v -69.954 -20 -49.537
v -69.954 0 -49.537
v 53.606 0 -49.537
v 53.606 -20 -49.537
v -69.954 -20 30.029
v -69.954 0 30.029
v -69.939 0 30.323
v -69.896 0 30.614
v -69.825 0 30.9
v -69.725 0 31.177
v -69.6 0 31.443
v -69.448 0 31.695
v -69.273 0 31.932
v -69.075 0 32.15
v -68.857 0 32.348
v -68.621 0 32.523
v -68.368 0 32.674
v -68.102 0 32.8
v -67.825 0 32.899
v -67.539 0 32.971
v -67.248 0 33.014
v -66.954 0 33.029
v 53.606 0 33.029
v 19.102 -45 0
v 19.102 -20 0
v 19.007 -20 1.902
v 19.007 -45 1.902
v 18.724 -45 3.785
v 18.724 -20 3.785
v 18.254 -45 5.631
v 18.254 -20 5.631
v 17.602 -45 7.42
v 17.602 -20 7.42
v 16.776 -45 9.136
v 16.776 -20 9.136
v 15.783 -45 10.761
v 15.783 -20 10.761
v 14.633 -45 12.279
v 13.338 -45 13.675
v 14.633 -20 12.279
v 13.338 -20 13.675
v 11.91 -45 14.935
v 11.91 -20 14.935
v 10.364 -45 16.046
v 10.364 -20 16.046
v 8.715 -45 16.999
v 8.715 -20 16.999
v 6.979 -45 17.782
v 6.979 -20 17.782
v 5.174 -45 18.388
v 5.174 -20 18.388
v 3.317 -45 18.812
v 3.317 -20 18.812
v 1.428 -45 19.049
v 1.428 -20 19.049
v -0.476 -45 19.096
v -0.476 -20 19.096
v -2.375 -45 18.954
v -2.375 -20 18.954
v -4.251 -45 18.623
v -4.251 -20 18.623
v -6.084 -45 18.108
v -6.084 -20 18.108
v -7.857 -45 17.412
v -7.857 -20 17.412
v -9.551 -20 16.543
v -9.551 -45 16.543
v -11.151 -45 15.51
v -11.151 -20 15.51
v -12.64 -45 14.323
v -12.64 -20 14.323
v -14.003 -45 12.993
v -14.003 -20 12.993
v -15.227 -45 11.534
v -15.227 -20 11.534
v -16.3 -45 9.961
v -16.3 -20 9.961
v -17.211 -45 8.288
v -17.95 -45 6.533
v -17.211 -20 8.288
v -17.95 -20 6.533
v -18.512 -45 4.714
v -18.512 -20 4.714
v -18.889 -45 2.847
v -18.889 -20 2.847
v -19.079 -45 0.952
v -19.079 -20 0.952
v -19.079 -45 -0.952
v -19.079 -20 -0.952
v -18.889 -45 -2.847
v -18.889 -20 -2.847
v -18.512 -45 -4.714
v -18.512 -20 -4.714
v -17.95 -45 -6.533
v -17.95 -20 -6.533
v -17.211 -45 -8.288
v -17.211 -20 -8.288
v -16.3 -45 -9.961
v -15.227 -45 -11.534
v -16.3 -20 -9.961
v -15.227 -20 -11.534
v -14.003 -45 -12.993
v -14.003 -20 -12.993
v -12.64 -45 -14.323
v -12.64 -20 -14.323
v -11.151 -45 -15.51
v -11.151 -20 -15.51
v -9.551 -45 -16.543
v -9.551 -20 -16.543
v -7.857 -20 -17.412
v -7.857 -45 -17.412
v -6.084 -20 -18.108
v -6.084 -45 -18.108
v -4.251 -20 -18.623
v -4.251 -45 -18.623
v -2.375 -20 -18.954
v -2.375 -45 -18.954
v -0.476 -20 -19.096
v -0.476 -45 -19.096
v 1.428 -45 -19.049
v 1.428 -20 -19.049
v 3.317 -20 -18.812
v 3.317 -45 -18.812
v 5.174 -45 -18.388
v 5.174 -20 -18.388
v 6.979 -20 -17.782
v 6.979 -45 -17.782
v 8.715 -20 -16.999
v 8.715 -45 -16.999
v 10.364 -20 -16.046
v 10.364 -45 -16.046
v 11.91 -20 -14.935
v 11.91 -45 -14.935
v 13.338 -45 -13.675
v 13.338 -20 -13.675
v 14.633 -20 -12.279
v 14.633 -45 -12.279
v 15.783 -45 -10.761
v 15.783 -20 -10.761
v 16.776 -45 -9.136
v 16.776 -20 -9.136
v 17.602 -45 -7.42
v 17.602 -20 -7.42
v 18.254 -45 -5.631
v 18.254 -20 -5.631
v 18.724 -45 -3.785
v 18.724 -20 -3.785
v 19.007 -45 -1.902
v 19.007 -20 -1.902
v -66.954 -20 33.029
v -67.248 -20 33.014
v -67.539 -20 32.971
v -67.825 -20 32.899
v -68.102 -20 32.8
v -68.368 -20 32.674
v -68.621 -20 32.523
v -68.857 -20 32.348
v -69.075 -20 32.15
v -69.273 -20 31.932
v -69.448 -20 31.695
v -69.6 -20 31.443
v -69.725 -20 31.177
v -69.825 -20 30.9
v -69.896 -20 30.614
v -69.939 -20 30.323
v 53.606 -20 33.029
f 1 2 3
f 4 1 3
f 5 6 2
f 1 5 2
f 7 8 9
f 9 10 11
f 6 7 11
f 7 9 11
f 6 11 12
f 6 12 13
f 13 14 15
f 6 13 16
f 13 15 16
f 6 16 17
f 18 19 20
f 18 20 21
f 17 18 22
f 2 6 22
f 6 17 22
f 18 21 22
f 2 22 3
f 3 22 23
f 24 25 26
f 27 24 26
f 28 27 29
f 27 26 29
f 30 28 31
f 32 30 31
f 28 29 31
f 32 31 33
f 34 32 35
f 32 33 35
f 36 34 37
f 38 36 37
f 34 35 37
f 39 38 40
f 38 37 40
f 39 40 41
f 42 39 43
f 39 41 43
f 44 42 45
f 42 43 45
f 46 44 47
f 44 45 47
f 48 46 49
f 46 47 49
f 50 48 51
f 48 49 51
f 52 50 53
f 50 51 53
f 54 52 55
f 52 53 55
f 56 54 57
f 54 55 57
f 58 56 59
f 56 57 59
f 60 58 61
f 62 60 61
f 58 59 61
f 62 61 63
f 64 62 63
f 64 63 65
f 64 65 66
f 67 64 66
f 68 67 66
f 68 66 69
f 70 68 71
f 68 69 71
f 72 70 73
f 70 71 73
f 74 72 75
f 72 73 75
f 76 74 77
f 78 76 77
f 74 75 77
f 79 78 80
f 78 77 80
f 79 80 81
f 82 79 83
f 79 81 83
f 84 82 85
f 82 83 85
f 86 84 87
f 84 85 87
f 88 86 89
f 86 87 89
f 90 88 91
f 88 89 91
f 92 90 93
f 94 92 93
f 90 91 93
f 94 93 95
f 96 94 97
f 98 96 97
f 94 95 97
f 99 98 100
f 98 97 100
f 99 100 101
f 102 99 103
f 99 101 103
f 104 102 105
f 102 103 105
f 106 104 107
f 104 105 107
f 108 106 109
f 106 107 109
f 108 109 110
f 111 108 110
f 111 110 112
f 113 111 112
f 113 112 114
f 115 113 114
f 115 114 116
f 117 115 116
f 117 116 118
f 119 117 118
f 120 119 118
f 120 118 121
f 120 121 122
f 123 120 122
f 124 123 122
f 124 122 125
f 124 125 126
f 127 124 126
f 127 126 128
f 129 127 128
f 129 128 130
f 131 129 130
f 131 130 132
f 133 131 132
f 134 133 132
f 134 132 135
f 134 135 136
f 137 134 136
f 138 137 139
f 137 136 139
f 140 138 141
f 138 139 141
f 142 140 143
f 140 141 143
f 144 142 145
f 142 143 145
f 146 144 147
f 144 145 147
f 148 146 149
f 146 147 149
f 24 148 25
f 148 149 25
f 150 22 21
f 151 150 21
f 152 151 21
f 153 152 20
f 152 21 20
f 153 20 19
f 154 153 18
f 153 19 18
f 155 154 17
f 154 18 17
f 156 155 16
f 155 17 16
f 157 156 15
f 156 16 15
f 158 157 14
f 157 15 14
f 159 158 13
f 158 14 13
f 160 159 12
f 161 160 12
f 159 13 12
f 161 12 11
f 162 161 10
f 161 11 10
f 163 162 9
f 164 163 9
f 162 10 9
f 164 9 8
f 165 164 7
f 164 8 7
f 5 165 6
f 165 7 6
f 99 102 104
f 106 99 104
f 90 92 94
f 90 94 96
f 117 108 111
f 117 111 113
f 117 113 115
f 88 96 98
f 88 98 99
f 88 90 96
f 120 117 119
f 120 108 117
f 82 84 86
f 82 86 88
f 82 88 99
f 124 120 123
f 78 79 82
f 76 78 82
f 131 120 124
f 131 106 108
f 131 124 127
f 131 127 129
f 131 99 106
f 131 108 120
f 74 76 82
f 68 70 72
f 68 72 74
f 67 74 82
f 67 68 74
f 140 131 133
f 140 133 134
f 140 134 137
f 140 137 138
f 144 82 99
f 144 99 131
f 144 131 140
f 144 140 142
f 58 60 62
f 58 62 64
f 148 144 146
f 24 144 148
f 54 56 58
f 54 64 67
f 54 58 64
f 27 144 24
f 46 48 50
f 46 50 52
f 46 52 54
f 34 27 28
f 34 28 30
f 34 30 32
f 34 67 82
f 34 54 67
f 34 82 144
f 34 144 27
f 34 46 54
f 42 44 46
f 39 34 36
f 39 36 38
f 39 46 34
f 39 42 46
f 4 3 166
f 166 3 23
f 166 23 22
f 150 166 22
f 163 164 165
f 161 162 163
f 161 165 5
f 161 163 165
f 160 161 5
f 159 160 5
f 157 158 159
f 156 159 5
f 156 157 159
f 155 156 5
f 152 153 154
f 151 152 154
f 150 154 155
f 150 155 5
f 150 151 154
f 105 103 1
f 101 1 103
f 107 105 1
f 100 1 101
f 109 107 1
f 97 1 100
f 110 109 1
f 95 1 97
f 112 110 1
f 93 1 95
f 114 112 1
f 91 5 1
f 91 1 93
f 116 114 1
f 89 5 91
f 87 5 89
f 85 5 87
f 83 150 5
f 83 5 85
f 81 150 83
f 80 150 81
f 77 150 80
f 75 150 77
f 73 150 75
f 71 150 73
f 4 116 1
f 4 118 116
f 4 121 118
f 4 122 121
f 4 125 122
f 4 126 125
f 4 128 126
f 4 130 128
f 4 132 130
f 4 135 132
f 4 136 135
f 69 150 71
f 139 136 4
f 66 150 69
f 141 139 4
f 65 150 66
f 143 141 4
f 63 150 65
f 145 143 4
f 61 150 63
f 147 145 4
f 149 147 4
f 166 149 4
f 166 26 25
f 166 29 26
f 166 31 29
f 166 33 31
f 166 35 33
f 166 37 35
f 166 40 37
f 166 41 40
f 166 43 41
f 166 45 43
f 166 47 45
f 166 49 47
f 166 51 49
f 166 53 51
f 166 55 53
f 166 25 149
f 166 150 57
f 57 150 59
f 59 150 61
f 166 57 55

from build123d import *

# Parameters (mm, degrees)
F1_DEPTH = 20
F2_R     = 19.102377
F3_DEPTH = 25


with BuildPart() as f1:
    # F0 (on Front) → F1 (new body)
    with BuildSketch(Plane.XZ):
        with BuildLine():
            Line((53.605944, 33.028656), (-66.953859, 33.028656))
            ThreePointArc((-66.953859, 33.028656), (-69.075179, 32.149976), (-69.953859, 30.028656))
            Line((-69.953859, 30.028656), (-69.953859, -49.536757))
            Line((-69.953859, -49.536757), (53.605944, -49.536757))
            Line((53.605944, -49.536757), (53.605944, 33.028656))
        make_face()
    extrude(amount=F1_DEPTH)

    # F2 (on face) → F3 (join)
    with BuildSketch(Plane.XZ.offset(20)):
        Circle(F2_R)
    extrude(amount=F3_DEPTH)


solid = f1.part
